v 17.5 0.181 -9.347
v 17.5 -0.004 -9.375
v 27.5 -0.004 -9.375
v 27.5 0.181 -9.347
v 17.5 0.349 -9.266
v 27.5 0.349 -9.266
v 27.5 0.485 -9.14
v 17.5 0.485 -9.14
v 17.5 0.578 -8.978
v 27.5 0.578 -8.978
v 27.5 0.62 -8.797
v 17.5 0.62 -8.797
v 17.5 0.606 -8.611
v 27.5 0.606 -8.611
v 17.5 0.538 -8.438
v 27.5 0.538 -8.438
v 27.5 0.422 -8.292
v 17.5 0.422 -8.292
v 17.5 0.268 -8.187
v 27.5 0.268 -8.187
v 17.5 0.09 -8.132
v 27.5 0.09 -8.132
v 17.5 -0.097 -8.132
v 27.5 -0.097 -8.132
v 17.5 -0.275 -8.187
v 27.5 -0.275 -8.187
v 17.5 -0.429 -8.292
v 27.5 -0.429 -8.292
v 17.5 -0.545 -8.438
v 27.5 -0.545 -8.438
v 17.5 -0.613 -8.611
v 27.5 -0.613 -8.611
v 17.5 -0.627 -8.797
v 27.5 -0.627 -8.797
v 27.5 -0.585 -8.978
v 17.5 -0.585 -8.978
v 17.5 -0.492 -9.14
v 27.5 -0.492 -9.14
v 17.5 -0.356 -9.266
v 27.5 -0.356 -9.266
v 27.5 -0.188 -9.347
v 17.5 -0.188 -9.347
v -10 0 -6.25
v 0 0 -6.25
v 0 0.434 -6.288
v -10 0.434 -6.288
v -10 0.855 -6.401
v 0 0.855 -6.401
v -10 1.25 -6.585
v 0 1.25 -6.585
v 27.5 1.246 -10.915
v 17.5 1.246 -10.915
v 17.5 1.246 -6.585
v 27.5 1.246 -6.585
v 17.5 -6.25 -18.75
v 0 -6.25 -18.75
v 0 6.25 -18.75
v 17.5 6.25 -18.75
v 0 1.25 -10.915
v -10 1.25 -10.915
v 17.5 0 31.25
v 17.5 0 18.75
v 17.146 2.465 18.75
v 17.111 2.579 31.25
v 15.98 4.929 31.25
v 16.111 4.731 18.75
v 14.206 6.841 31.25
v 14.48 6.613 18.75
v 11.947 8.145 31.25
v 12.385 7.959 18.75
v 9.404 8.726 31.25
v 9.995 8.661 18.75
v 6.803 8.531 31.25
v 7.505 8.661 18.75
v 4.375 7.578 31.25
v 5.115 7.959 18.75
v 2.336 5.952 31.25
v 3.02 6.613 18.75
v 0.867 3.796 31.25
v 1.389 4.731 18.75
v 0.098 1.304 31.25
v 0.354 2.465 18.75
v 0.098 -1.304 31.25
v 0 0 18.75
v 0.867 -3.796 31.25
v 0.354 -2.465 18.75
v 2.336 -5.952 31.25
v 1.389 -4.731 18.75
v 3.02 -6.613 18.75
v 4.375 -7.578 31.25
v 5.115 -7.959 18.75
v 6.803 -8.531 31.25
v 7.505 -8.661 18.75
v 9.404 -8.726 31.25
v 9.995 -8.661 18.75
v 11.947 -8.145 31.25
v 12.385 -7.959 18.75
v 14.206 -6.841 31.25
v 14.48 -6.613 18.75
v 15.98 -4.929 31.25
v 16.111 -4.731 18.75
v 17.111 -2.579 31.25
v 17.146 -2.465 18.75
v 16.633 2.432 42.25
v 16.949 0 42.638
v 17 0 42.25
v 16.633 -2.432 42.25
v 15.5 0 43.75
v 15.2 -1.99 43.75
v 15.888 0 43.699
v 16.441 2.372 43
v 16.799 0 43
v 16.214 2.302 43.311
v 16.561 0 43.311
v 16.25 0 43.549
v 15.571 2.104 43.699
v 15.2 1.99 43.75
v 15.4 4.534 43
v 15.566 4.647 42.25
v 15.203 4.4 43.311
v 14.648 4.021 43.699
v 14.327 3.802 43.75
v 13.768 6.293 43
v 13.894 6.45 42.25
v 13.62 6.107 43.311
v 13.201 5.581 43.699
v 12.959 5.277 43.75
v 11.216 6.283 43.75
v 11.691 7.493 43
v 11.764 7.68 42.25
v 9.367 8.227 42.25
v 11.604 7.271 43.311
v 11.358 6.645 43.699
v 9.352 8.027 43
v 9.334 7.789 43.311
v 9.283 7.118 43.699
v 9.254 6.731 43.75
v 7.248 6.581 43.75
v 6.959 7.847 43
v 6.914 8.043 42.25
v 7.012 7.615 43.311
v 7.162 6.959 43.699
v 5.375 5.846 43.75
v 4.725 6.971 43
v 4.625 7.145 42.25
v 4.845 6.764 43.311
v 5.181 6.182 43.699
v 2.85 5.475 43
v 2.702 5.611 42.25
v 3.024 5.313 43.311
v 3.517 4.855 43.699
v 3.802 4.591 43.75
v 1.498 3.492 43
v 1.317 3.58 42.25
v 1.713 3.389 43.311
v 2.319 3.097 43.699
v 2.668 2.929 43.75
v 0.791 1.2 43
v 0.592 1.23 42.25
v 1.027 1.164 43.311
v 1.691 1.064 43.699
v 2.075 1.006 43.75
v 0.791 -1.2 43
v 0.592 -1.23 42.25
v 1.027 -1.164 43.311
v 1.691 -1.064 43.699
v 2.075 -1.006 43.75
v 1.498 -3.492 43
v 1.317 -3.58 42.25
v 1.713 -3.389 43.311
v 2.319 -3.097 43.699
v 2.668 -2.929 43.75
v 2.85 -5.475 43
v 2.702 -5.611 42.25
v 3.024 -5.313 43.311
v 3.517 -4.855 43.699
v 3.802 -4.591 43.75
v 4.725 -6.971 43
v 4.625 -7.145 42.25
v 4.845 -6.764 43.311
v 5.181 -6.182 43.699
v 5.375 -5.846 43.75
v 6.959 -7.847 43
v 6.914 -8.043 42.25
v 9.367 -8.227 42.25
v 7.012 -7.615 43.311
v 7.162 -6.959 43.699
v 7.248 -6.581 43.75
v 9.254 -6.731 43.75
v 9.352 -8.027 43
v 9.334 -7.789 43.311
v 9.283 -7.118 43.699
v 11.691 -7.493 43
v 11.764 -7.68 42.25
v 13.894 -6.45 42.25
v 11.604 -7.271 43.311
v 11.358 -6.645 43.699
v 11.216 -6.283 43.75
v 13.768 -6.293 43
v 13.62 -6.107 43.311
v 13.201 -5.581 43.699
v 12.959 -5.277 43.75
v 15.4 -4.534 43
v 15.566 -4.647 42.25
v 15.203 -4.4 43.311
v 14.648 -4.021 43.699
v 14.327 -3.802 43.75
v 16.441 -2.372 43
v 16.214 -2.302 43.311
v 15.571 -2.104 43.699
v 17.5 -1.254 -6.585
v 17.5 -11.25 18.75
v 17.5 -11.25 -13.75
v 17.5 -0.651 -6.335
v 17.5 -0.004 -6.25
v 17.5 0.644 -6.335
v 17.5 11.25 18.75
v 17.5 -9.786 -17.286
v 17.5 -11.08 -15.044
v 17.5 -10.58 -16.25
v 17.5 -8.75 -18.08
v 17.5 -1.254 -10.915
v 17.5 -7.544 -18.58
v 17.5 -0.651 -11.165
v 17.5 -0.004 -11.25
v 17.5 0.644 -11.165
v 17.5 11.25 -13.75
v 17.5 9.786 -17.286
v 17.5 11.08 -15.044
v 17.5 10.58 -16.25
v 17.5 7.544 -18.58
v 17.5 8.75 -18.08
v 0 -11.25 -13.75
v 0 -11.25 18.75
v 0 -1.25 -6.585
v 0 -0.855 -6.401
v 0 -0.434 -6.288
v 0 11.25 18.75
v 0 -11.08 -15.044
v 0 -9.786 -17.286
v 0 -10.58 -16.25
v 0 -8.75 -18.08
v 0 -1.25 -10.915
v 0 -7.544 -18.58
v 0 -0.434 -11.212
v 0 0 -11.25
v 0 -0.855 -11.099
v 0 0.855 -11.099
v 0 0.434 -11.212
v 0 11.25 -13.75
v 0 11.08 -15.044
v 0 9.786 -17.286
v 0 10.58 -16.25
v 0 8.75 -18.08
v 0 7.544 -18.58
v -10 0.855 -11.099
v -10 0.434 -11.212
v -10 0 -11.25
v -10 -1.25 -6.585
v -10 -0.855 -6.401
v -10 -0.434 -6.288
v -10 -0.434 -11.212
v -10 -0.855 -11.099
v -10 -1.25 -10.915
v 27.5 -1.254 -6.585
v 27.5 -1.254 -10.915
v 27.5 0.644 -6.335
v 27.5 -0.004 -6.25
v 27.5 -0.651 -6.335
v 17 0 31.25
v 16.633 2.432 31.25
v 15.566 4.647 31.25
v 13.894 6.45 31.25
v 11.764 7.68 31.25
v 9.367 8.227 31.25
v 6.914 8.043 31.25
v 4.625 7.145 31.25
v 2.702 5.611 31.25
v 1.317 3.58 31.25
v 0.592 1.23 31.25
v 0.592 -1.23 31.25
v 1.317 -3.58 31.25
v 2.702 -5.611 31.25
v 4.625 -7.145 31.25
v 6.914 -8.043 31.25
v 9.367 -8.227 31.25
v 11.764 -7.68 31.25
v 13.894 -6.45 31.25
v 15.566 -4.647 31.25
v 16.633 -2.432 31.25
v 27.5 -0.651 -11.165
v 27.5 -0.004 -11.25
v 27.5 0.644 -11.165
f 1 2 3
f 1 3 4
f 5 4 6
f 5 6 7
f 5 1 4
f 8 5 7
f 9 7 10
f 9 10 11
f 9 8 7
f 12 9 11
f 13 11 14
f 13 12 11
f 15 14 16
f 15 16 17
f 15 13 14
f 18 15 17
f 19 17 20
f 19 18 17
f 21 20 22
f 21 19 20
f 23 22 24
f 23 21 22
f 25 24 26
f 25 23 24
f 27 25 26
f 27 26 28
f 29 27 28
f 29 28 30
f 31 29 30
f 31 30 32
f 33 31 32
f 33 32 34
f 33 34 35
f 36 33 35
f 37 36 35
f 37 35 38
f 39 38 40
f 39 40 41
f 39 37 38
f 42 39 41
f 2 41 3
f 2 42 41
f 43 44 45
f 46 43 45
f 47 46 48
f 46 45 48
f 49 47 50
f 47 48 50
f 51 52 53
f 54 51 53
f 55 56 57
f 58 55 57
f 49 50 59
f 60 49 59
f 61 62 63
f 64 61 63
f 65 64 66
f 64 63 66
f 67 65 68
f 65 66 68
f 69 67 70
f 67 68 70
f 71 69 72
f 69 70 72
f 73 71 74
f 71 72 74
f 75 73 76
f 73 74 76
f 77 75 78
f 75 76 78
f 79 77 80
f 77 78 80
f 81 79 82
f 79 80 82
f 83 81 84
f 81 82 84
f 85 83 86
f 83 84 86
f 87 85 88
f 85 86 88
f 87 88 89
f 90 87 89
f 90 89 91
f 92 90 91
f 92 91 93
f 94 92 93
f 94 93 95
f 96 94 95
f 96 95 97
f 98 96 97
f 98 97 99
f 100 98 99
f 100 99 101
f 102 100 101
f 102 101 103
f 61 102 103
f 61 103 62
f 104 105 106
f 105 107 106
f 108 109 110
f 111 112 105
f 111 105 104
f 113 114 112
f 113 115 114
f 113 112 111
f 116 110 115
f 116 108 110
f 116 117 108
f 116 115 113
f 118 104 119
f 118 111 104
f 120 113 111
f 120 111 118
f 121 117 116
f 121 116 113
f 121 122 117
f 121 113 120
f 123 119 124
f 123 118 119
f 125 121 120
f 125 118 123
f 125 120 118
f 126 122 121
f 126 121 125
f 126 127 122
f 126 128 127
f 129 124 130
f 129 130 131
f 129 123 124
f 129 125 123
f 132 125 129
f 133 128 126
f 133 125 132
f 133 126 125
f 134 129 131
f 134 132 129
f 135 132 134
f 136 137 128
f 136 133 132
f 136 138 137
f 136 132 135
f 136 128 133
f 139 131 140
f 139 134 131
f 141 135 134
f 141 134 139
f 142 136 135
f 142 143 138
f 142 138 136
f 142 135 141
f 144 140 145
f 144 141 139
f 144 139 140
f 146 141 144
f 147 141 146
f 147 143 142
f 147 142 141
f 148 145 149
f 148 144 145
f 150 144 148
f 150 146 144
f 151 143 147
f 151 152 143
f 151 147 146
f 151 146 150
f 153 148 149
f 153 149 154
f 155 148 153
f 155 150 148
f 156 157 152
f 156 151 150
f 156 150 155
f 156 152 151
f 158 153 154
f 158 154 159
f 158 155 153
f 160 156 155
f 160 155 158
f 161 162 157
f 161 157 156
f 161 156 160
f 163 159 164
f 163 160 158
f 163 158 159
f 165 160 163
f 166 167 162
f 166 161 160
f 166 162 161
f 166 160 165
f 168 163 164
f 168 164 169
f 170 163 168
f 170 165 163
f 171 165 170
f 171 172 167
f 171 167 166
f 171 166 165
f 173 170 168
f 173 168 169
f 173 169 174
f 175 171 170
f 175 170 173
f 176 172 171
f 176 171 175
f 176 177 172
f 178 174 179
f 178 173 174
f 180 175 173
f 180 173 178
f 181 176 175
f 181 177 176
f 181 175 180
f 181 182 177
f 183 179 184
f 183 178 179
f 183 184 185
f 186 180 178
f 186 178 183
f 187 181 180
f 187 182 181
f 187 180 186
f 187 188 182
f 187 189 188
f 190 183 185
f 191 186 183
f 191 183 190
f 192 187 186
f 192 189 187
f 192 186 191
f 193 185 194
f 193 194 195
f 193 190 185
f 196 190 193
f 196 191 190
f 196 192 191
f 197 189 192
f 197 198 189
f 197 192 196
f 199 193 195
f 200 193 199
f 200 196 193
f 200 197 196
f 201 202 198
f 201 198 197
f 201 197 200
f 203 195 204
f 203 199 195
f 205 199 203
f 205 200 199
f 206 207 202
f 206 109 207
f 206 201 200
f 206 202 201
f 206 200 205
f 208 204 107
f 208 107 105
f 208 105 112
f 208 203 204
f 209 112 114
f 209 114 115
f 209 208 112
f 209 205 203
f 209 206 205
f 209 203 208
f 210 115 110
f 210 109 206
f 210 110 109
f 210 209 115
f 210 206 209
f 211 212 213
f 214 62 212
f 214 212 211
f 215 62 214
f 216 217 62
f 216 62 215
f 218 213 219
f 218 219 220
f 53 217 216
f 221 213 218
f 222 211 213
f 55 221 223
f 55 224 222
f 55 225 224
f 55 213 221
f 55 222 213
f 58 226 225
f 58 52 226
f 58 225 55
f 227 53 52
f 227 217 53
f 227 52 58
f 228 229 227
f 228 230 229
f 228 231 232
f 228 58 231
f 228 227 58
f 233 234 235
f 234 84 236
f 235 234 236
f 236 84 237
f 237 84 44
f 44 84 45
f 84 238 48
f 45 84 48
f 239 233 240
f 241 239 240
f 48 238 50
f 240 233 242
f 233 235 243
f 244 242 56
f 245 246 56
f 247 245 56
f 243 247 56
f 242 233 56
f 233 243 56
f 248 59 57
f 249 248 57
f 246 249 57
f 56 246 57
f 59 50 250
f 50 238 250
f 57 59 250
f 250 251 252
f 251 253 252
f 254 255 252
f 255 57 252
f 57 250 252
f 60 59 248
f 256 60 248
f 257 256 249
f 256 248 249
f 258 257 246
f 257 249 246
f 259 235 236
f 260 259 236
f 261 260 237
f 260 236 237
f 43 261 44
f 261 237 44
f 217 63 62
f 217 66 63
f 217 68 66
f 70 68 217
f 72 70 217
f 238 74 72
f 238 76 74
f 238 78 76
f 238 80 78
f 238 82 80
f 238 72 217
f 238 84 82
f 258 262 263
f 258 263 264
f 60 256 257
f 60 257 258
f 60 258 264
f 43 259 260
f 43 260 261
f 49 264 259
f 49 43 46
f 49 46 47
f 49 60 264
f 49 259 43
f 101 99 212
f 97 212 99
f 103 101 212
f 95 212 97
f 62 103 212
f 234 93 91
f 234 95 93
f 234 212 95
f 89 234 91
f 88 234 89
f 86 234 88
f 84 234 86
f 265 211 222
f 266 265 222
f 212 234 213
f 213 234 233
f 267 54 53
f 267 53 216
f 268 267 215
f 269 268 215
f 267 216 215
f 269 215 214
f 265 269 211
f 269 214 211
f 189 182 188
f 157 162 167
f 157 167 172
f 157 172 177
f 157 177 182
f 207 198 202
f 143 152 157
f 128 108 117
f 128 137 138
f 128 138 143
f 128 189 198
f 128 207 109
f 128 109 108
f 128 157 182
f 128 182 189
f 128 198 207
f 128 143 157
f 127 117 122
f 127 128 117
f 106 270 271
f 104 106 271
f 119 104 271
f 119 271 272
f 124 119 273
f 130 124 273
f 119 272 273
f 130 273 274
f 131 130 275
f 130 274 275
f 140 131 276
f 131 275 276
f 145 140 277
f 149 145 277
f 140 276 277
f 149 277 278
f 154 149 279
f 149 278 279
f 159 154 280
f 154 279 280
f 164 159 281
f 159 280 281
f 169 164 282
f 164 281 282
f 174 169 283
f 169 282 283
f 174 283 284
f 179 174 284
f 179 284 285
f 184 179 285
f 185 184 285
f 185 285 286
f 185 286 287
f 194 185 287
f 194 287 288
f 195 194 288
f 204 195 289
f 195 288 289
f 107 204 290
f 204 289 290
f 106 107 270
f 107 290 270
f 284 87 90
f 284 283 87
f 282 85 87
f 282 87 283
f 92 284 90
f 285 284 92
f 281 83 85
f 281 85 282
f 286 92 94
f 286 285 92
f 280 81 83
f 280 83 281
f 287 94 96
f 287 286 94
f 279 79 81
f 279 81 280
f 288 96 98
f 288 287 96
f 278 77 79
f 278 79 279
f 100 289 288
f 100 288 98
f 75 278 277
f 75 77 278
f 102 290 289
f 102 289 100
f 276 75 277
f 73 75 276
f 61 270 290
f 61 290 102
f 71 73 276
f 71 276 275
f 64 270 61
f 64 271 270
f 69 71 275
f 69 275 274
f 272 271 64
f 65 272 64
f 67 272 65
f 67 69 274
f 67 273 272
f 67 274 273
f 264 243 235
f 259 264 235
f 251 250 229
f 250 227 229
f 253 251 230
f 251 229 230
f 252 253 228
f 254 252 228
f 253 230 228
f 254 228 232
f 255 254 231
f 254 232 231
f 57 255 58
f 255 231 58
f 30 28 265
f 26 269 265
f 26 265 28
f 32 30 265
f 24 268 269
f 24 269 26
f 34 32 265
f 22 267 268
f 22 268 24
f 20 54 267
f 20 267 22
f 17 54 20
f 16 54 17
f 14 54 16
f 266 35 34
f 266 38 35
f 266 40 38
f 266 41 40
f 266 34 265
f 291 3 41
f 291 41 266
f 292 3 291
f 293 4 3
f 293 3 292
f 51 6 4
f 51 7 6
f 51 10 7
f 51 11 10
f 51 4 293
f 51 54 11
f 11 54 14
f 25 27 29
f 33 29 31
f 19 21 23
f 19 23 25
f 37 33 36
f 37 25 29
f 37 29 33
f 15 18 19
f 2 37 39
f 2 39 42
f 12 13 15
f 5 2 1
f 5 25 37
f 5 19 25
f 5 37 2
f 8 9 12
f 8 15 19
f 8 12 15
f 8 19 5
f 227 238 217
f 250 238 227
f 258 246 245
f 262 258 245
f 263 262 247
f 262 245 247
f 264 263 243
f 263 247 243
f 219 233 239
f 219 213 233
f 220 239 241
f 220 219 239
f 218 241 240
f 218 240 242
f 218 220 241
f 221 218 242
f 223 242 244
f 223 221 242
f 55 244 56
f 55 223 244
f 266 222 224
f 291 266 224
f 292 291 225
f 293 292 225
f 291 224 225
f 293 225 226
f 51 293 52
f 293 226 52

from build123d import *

# Parameters (mm, degrees)
SKETCH1_W           = 37.5
SKETCH1_H           = 22.5
BOSS_EXTRUDE2_DEPTH = 17.5
SKETCH2_R           = 0.625
BOSS_EXTRUDE3_DEPTH = 10
SKETCH3_R           = 8.75
BOSS_EXTRUDE4_DEPTH = 12.5
SKETCH4_R           = 8.25
BOSS_EXTRUDE5_DEPTH = 12.5
FILLET2_R           = 1.5
FILLET3_R           = 5
BOSS_EXTRUDE6_DEPTH = 10


with BuildPart() as part:
    # Sketch1 → Boss-Extrude2 (new body)
    with BuildSketch(Plane(origin=(0, 0, 0), x_dir=(0, 0, -1), z_dir=(1, 0, 0))):
        Rectangle(SKETCH1_W, SKETCH1_H)
    extrude(amount=BOSS_EXTRUDE2_DEPTH)

    # Sketch2 → Boss-Extrude3 (add)
    with BuildSketch(Plane(origin=(17.5, 0, 0), x_dir=(0, 0, -1), z_dir=(1, 0, 0))):
        with BuildLine():
            Line((10.915063509, 1.246479188), (6.584936491, 1.246479188))
            ThreePointArc((6.584936491, 1.246479188), (6.25, -0.003520812), (6.584936491, -1.253520812))
            Line((6.584936491, -1.253520812), (10.915063509, -1.253520812))
            ThreePointArc((10.915063509, -1.253520812), (11.25, -0.003520812), (10.915063509, 1.246479188))
        make_face()
        with Locations((8.75, -0.003520812)):
            Circle(SKETCH2_R, mode=Mode.SUBTRACT)
    extrude(amount=BOSS_EXTRUDE3_DEPTH)

    # Sketch3 → Boss-Extrude4 (add)
    with BuildSketch(Plane.XY.offset(18.75)):
        with Locations((8.75, 0)):
            Circle(SKETCH3_R)
    extrude(amount=BOSS_EXTRUDE4_DEPTH)

    # Sketch4 → Boss-Extrude5 (add)
    with BuildSketch(Plane.XY.offset(31.25)):
        with Locations((8.75, 0)):
            Circle(SKETCH4_R)
    extrude(amount=BOSS_EXTRUDE5_DEPTH)

    # Fillet2
    fillet2_edges = [part.edges().sort_by_distance(p)[0] for p in [
        (0.5, 0, 43.75),
    ]]
    fillet(fillet2_edges, radius=FILLET2_R)

    # Fillet3
    fillet3_edges = [part.edges().sort_by_distance(p)[0] for p in [
        (8.75, -11.25, -18.75),
        (8.75, 11.25, -18.75),
    ]]
    fillet(fillet3_edges, radius=FILLET3_R)

    # Sketch5 → Boss-Extrude6 (add)
    with BuildSketch(Plane.ZY):
        with BuildLine():
            ThreePointArc((-10.915063509, 1.25), (-11.164814566, 0.647047613), (-11.25, 0))
            Line((-11.25, 0), (-8.75, 0))
            Line((-8.75, 0), (-6.25, 0))
            ThreePointArc((-6.25, 0), (-6.335185434, 0.647047613), (-6.584936491, 1.25))
            Line((-6.584936491, 1.25), (-10.915063509, 1.25))
        make_face()
        with BuildLine():
            Line((-8.75, 0), (-11.25, 0))
            ThreePointArc((-11.25, 0), (-11.164814566, -0.647047613), (-10.915063509, -1.25))
            Line((-10.915063509, -1.25), (-6.584936491, -1.25))
            ThreePointArc((-6.584936491, -1.25), (-6.335185434, -0.647047613), (-6.25, 0))
            Line((-6.25, 0), (-8.75, 0))
        make_face()
    extrude(amount=BOSS_EXTRUDE6_DEPTH)


solid = part.part
